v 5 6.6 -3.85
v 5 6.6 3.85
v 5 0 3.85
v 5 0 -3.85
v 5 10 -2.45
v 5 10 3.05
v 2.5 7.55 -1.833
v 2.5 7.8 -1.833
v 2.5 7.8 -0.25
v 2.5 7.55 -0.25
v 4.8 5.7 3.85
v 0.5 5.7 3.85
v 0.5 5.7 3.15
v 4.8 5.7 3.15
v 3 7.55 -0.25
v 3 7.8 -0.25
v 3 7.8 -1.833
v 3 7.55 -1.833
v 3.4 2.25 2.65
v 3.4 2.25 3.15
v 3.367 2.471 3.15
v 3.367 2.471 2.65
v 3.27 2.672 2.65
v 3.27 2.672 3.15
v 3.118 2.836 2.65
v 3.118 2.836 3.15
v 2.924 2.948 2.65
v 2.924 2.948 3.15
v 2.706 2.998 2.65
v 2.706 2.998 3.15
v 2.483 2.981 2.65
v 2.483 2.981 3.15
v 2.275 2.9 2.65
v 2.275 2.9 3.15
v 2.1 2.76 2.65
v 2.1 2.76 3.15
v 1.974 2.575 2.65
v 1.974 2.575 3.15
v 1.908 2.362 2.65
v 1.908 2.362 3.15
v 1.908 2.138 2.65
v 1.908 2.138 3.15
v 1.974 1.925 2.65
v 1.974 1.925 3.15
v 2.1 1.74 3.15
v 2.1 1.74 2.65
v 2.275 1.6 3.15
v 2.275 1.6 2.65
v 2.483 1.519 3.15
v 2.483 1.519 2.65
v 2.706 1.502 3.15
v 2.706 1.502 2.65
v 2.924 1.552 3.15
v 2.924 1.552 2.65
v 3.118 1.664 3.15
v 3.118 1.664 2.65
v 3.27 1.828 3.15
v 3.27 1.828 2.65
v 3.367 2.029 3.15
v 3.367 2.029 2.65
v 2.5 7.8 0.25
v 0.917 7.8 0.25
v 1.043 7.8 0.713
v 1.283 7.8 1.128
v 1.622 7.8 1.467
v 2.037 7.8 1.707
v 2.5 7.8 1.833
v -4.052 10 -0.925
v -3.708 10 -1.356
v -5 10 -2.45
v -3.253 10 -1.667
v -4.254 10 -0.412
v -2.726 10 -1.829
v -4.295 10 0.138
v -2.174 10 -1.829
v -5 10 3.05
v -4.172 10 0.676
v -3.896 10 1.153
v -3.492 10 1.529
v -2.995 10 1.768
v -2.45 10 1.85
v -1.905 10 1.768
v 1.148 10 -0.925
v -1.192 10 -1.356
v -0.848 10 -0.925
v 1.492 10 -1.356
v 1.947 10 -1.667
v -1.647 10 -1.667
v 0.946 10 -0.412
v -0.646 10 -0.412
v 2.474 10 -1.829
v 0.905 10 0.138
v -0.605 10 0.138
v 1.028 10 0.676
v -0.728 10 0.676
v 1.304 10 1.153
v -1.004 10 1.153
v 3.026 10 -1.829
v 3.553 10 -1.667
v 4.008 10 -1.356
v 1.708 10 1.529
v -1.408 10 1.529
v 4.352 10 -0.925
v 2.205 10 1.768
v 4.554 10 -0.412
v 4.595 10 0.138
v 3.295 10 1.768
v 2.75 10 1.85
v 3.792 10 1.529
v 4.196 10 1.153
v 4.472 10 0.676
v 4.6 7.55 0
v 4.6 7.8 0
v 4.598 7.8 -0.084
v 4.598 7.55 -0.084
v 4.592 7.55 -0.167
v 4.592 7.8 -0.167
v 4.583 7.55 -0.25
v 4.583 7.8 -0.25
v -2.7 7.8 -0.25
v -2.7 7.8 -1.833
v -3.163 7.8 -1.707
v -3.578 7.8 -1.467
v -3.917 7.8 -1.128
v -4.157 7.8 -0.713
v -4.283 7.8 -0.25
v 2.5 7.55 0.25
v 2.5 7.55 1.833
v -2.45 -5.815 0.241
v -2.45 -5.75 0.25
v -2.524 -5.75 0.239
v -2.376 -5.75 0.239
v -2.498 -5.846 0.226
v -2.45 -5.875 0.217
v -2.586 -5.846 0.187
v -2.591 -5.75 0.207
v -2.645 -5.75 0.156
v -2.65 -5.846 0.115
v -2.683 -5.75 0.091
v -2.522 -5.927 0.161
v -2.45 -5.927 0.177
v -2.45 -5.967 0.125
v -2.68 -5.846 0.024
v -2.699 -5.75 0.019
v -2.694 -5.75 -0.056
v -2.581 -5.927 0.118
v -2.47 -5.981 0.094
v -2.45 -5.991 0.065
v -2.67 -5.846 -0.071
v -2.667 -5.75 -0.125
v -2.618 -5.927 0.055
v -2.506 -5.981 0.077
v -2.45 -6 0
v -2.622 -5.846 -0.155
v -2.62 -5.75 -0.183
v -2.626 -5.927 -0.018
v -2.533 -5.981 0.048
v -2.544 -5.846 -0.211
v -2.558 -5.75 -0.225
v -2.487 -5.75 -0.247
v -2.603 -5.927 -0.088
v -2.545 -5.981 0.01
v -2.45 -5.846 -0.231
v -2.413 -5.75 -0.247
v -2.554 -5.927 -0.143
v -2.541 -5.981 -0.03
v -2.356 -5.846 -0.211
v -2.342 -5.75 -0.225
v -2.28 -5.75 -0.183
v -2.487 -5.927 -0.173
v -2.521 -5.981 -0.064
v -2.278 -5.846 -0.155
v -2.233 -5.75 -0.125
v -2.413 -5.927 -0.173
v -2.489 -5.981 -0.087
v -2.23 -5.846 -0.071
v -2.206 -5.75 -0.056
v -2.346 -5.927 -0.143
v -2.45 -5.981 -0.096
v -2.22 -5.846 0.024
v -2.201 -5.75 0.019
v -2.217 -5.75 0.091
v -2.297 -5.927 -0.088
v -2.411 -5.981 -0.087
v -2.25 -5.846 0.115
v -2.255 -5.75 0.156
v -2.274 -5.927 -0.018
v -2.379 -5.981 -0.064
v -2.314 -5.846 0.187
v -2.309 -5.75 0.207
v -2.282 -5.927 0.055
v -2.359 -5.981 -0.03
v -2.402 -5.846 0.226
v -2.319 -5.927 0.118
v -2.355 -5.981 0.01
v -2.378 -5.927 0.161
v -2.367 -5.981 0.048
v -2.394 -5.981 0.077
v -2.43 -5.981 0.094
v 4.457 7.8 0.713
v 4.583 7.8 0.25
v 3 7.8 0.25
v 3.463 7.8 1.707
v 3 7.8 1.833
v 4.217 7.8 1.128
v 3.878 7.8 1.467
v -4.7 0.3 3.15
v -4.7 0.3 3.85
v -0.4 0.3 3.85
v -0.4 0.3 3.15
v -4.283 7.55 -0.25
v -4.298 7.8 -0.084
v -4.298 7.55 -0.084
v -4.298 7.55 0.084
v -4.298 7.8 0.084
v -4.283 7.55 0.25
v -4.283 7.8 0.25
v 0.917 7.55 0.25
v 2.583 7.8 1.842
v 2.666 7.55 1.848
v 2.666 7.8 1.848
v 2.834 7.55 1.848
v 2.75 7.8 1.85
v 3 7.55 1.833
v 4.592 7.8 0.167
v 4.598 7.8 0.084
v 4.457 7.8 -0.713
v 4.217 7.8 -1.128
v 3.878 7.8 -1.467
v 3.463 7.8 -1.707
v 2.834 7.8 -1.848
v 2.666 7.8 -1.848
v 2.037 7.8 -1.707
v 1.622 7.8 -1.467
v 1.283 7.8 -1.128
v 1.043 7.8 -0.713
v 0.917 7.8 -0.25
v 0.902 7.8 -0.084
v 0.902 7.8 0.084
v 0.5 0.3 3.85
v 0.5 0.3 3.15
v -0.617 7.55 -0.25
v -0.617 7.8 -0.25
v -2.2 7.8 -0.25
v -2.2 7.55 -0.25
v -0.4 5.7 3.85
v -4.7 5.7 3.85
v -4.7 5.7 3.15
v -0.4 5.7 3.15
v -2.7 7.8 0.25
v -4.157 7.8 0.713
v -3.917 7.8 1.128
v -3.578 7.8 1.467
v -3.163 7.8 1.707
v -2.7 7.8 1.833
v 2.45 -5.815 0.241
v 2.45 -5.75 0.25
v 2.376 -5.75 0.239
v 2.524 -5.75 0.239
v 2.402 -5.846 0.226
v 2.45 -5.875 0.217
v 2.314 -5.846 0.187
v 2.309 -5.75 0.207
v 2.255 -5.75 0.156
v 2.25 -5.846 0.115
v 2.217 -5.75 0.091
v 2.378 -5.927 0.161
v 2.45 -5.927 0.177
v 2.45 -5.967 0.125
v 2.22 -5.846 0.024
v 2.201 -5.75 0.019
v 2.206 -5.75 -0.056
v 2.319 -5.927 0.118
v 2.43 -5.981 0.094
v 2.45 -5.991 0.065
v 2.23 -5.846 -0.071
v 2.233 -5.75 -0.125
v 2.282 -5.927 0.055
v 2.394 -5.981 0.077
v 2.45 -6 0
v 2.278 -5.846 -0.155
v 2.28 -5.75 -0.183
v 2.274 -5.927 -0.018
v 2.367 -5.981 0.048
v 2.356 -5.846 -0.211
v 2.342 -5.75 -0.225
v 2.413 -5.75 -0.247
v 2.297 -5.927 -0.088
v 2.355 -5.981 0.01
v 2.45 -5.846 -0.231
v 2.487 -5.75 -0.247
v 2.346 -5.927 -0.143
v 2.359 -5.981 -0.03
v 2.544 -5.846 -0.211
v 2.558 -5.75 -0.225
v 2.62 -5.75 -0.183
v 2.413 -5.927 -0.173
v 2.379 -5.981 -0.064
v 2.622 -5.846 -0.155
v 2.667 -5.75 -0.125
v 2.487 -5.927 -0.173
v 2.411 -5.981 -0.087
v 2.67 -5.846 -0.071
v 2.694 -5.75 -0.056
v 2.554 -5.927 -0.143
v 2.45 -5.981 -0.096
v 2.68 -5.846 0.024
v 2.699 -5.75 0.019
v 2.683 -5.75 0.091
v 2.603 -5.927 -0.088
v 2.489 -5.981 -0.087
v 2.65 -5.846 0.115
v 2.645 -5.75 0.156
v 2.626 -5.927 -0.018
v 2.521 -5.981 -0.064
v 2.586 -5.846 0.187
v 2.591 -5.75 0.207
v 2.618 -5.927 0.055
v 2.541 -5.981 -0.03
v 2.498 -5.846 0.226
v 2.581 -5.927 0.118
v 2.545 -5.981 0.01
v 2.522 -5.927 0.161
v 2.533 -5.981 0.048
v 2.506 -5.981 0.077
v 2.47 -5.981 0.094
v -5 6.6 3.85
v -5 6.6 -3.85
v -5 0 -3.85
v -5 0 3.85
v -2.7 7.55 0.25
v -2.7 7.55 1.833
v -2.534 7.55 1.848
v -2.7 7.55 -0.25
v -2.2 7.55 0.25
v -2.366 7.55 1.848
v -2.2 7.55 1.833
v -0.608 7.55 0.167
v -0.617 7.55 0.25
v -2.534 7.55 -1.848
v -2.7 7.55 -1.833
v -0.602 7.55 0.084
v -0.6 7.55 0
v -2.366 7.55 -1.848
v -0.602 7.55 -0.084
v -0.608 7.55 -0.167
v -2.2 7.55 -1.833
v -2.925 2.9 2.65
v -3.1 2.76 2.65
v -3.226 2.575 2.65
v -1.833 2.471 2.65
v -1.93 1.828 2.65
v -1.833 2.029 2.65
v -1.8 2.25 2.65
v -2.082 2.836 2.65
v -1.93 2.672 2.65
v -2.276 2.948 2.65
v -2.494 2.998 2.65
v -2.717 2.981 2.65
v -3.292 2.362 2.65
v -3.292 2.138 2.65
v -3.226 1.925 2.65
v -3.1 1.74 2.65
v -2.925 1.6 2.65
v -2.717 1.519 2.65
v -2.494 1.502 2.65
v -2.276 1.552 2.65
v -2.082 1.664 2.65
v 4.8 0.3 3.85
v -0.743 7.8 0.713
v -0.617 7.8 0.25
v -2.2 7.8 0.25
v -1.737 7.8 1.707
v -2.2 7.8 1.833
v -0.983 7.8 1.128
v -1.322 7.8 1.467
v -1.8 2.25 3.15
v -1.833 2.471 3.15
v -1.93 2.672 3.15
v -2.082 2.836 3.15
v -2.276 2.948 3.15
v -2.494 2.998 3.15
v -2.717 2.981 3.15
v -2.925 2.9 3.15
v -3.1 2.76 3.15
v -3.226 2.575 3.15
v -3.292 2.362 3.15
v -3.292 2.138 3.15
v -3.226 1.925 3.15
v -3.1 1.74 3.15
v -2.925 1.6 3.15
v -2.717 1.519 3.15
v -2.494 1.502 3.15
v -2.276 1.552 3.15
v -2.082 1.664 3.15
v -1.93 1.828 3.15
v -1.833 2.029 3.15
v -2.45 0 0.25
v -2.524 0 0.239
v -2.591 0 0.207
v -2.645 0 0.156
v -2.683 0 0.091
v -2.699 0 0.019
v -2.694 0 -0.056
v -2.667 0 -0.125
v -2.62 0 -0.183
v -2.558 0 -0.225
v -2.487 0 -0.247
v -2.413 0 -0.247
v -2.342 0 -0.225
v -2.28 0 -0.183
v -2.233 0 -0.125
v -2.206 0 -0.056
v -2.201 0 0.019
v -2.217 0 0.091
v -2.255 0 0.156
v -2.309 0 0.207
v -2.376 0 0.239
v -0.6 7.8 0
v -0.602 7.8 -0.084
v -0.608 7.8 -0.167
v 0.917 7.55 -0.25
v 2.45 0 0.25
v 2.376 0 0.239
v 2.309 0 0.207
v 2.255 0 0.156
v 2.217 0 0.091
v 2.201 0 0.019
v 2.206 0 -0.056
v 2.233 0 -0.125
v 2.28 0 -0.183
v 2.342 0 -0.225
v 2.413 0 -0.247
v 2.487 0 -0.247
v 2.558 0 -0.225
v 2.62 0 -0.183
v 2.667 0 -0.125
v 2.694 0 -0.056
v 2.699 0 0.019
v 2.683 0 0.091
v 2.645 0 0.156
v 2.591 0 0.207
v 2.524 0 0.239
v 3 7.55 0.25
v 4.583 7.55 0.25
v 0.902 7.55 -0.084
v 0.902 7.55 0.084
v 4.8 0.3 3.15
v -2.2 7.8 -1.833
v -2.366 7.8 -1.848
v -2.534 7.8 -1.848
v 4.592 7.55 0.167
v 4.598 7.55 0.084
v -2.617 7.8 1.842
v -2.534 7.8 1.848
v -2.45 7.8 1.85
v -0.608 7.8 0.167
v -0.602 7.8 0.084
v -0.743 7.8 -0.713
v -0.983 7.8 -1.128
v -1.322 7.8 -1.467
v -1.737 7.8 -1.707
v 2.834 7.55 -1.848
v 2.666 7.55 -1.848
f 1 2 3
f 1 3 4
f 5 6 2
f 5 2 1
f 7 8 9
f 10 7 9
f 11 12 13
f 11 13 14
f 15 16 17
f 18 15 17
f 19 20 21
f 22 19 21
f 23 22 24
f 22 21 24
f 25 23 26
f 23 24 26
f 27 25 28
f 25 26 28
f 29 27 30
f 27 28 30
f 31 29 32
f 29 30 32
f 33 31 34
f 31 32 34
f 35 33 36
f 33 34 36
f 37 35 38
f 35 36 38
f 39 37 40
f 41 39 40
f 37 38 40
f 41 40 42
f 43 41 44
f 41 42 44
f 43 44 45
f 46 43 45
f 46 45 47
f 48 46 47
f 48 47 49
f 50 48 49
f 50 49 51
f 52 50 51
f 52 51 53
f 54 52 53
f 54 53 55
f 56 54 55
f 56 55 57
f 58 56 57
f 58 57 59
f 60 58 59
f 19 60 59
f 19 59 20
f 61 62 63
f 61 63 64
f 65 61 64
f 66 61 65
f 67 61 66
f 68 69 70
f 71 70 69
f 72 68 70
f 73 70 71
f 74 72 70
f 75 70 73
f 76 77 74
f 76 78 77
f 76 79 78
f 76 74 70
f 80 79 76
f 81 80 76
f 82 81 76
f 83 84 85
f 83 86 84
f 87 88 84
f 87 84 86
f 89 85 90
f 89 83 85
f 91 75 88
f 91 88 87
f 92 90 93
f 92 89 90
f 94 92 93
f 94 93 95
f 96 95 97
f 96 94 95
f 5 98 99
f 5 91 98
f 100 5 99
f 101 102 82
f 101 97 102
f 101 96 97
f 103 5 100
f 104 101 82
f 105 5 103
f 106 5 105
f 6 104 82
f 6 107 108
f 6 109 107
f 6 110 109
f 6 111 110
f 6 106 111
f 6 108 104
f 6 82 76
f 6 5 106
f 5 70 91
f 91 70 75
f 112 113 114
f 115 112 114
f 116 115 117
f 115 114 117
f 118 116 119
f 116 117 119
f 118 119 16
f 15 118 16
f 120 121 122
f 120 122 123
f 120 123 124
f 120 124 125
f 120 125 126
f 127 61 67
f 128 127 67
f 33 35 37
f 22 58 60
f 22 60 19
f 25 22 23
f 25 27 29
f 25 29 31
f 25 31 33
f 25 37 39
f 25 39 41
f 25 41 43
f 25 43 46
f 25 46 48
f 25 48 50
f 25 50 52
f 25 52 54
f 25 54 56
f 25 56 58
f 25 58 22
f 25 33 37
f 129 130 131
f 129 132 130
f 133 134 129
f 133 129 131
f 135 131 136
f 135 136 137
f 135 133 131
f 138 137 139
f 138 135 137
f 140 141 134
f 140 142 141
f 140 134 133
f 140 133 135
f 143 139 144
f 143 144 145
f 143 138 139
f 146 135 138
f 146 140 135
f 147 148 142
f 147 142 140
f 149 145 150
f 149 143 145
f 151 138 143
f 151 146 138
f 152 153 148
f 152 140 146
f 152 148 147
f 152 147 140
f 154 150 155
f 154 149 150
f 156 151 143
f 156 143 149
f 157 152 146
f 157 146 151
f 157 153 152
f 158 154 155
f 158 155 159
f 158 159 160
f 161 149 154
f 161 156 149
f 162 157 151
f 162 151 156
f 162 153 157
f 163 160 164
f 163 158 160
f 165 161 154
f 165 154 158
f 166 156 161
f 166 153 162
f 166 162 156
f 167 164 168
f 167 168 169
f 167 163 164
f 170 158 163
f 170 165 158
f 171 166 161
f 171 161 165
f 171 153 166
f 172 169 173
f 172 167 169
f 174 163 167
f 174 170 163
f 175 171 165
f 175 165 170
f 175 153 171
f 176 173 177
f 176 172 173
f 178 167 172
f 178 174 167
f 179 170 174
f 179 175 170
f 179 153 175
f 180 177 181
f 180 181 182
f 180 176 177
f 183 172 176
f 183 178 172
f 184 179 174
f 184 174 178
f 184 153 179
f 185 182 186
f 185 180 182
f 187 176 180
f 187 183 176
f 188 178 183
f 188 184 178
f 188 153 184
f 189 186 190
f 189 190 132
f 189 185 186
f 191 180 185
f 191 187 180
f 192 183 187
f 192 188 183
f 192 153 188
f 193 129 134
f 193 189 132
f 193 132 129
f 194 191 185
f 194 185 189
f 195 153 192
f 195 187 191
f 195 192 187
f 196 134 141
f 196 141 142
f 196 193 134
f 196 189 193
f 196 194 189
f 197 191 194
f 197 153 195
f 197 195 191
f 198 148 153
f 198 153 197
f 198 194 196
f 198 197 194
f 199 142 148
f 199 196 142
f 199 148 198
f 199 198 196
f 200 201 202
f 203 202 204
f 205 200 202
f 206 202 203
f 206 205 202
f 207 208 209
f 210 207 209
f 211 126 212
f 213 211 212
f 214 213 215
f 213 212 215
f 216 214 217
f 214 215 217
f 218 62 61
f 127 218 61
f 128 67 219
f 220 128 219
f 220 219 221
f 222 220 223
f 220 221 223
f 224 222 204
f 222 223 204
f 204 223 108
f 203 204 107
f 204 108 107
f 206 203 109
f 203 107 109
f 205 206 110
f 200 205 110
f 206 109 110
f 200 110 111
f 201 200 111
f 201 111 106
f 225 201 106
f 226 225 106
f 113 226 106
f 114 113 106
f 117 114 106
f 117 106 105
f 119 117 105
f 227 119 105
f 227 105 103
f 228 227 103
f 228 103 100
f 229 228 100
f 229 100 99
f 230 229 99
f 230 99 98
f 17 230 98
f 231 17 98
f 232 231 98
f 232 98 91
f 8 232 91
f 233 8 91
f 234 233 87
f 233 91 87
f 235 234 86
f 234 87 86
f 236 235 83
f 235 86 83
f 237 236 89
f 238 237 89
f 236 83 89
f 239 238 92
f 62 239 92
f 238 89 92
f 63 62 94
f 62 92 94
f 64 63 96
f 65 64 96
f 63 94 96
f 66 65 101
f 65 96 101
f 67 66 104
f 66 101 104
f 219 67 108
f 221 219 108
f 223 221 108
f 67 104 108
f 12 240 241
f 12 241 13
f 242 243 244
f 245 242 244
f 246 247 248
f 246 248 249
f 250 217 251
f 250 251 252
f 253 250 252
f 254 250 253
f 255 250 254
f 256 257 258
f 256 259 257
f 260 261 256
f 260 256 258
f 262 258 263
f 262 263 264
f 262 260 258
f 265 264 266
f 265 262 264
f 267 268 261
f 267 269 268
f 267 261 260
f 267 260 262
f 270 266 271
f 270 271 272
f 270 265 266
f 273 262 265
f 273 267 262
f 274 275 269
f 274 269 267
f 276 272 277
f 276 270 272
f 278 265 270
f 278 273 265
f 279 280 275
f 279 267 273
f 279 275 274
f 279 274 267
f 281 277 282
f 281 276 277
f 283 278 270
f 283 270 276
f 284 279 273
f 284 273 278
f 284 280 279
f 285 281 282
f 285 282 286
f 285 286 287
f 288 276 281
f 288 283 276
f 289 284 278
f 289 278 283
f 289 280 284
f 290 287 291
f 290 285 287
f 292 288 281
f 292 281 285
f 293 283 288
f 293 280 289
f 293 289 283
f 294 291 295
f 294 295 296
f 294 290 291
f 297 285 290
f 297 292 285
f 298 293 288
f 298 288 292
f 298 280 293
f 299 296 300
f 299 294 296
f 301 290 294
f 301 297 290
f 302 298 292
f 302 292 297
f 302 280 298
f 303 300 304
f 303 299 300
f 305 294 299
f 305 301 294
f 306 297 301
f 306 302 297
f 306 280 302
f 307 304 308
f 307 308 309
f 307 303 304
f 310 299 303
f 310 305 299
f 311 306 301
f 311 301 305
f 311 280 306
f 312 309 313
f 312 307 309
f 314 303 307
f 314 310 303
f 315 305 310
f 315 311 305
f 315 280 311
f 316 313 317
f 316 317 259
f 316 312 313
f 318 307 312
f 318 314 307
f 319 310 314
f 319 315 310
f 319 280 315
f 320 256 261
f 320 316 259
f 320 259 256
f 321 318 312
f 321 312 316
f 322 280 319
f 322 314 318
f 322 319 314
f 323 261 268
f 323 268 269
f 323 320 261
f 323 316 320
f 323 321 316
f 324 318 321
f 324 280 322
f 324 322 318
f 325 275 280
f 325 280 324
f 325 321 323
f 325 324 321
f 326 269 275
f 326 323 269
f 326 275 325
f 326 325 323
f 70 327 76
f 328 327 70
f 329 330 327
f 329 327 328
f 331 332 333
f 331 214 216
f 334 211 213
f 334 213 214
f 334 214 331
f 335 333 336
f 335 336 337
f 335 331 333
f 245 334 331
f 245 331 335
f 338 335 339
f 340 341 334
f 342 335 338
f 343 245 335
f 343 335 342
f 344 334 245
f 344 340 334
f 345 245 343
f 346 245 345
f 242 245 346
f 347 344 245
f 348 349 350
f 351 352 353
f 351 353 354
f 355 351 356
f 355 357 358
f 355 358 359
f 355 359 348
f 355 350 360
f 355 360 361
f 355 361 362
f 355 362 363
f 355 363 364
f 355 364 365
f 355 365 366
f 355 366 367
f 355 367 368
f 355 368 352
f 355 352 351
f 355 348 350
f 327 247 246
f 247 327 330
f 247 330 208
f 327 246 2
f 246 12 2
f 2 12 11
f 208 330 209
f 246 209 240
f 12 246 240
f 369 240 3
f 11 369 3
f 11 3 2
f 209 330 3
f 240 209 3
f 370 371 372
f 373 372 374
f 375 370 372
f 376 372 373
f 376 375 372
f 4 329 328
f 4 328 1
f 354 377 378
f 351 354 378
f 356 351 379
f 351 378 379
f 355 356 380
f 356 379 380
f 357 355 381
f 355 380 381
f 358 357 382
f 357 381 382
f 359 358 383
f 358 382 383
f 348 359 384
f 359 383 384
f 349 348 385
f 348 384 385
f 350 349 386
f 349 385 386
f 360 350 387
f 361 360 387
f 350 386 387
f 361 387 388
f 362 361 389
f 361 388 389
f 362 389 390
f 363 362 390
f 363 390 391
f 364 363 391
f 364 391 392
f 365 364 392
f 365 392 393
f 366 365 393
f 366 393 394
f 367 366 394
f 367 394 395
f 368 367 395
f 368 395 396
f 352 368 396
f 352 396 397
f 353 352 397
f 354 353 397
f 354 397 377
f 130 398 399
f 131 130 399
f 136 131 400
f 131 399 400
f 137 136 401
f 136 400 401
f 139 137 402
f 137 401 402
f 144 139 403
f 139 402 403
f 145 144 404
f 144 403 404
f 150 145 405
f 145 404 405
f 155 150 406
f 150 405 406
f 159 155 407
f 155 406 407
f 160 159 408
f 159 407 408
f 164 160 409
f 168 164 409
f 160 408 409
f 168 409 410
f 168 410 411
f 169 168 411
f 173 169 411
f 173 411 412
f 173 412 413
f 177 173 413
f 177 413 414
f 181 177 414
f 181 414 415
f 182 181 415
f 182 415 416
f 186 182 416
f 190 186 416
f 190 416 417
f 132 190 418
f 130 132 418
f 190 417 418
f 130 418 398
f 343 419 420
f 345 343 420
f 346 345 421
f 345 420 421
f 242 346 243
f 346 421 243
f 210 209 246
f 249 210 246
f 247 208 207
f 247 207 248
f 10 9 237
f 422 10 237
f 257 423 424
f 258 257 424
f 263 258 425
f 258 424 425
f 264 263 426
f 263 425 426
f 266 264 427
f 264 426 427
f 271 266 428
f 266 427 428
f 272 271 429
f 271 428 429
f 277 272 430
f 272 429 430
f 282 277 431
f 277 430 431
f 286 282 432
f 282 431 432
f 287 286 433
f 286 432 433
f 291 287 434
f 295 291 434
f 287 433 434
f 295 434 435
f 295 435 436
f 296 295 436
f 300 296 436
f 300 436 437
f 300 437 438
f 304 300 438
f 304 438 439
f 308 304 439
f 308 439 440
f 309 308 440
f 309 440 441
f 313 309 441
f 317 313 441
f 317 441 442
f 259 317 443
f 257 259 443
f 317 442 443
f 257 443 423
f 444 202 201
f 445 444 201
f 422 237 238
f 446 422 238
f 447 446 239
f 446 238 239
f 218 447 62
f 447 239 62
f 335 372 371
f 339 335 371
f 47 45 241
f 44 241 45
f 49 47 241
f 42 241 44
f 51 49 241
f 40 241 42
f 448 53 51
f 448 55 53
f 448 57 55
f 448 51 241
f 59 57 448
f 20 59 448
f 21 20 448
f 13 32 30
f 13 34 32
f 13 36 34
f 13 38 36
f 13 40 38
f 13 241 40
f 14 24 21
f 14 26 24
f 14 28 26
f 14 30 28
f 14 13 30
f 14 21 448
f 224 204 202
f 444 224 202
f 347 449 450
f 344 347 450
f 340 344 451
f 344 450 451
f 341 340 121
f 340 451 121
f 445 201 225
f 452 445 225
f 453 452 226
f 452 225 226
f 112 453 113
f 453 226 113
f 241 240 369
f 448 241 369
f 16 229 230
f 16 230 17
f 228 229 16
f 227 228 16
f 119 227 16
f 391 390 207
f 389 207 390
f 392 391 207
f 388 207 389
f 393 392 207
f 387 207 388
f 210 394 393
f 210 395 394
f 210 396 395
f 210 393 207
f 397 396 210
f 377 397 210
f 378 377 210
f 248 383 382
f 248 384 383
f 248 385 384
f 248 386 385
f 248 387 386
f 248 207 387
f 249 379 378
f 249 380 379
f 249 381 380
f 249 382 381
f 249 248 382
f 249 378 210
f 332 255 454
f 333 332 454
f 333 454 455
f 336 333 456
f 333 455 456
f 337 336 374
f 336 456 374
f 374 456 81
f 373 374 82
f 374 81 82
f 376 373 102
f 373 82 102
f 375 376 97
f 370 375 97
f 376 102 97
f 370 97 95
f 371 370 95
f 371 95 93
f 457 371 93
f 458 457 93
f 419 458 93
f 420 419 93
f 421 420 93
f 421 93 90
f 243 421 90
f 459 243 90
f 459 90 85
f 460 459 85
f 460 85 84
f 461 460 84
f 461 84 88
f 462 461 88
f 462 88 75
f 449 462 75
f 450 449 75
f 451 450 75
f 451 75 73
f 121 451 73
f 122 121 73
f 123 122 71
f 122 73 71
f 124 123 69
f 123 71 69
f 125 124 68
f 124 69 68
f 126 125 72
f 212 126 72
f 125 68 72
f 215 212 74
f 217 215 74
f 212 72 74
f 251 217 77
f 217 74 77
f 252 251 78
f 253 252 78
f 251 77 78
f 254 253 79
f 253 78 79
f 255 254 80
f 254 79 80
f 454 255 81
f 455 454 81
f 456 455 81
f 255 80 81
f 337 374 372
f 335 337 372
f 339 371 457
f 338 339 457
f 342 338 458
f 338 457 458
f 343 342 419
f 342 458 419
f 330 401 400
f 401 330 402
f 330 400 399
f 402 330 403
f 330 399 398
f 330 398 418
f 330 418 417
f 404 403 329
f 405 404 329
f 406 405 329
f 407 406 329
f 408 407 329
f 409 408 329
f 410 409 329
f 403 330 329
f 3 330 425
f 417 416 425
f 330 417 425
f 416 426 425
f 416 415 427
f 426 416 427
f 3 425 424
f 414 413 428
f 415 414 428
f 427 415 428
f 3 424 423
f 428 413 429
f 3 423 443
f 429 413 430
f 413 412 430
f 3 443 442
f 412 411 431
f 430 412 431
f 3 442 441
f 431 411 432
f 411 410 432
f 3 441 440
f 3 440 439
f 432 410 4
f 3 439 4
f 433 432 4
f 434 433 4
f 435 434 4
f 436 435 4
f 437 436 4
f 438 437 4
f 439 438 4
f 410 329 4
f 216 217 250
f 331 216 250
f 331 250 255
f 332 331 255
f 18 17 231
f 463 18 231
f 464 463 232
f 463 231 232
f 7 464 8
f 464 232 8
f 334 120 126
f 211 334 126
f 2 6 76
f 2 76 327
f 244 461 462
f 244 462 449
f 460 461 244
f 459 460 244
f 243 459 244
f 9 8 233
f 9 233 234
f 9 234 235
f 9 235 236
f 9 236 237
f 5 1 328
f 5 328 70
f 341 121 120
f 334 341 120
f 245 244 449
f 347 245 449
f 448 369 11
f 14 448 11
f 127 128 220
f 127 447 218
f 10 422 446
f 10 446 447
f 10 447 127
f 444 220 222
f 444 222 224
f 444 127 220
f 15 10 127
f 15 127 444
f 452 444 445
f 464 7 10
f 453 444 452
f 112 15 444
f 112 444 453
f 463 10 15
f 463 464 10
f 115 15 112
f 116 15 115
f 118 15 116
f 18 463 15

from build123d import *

# Parameters (mm, degrees)
CROQUIS1_W                          = 10
CROQUIS1_H                          = 7.7
SALIENTE_EXTRUIR1_DEPTH             = 6.6
SALIENTE_EXTRUIR2_REACH             = 11.131
SALIENTE_EXTRUIR2_DIRECTION_2_REACH = 11.131
CROQUIS3_R                          = 1.85
CORTAR_EXTRUIR1_DEPTH               = 2.2
CORTAR_EXTRUIR2_DEPTH               = 0.25
MATRIZL1_COUNT                      = 2
MATRIZL1_PITCH                      = 5.2
CROQUIS5_W                          = 4.3
CROQUIS5_H                          = 5.4
CROQUIS5_R                          = 0.75
CORTAR_EXTRUIR3_DEPTH               = 0.7
CROQUIS5_2_R                        = 0.75
CORTAR_EXTRUIR4_DEPTH               = 1.2
MATRIZL2_COUNT                      = 2
MATRIZL2_PITCH                      = 5.2
CROQUIS6_R                          = 0.25
SALIENTE_EXTRUIR3_DEPTH             = 6
REDONDEO1_R                         = 0.25


with BuildPart() as part:
    # Croquis1 → Saliente-Extruir1 (new body)
    with BuildSketch(Plane(origin=(0, 0, 0), x_dir=(1, 0, 0), z_dir=(0, 1, 0))):
        Rectangle(CROQUIS1_W, CROQUIS1_H)
    extrude(amount=SALIENTE_EXTRUIR1_DEPTH)

    # Saliente-Extruir2: up to this face of the body (flat: up to its plane)
    saliente_extruir2_end = Plane(part.part.faces().sort_by_distance((5, 3.3, 0))[0])
    # Croquis2 → Saliente-Extruir2 (add, up to the picked face)
    with BuildSketch(Plane(origin=(0, 0, 0), x_dir=(0, 0, -1), z_dir=(1, 0, 0)), mode=Mode.PRIVATE) as saliente_extruir2_sk1:
        Polygon((-3.85, 6.6), (3.85, 6.6), (2.45, 10), (-3.05, 10), align=None)
    saliente_extruir2_tool1 = split(extrude(saliente_extruir2_sk1.sketch, amount=SALIENTE_EXTRUIR2_REACH, mode=Mode.PRIVATE), bisect_by=saliente_extruir2_end, keep=Keep.BOTH, mode=Mode.PRIVATE)
    add(saliente_extruir2_tool1.solids().sort_by(Axis((0, 8.205556, 0.141667), (1, 0, 0)))[0])

    # Saliente-Extruir2 direction 2: up to this face of the body (flat: up to its plane)
    saliente_extruir2_direction_2_end = Plane(part.part.faces().sort_by_distance((-5, 3.3, 0))[0])
    # Croquis2 → Saliente-Extruir2 direction 2 (add, up to the picked face)
    with BuildSketch(Plane(origin=(0, 0, 0), x_dir=(0, 0, -1), z_dir=(1, 0, 0)), mode=Mode.PRIVATE) as saliente_extruir2_direction_2_sk1:
        Polygon((-3.85, 6.6), (3.85, 6.6), (2.45, 10), (-3.05, 10), align=None)
    saliente_extruir2_direction_2_tool1 = split(extrude(saliente_extruir2_direction_2_sk1.sketch, amount=-SALIENTE_EXTRUIR2_DIRECTION_2_REACH, mode=Mode.PRIVATE), bisect_by=saliente_extruir2_direction_2_end, keep=Keep.BOTH, mode=Mode.PRIVATE)
    add(saliente_extruir2_direction_2_tool1.solids().sort_by(Axis((0, 8.205556, 0.141667), (-1, 0, 0)))[0])

    # Croquis3 → Cortar-Extruir1 (cut)
    with BuildSketch(Plane(origin=(0, 10, 0), x_dir=(1, 0, 0), z_dir=(0, 1, 0))):
        with Locations((-2.45, 0)):
            Circle(CROQUIS3_R)
    cortar_extruir1 = extrude(amount=-CORTAR_EXTRUIR1_DEPTH, mode=Mode.SUBTRACT)

    # Croquis4 → Cortar-Extruir2 (cut)
    with BuildSketch(Plane(origin=(0, 7.8, 0), x_dir=(1, 0, 0), z_dir=(0, 1, 0))):
        with BuildLine():
            ThreePointArc((-2.7, -1.833030278), (-2.45, -1.85), (-2.2, -1.833030278))
            Line((-2.2, -1.833030278), (-2.2, -0.25))
            Line((-2.2, -0.25), (-0.616969722, -0.25))
            ThreePointArc((-0.616969722, -0.25), (-0.604247306, -0.125287641), (-0.6, 0))
            ThreePointArc((-0.6, 0), (-0.604247306, 0.125287641), (-0.616969722, 0.25))
            Line((-0.616969722, 0.25), (-2.2, 0.25))
            Line((-2.2, 0.25), (-2.2, 1.833030278))
            ThreePointArc((-2.2, 1.833030278), (-2.45, 1.85), (-2.7, 1.833030278))
            Line((-2.7, 1.833030278), (-2.7, 0.25))
            Line((-2.7, 0.25), (-4.283030278, 0.25))
            ThreePointArc((-4.283030278, 0.25), (-4.3, 0), (-4.283030278, -0.25))
            Line((-4.283030278, -0.25), (-2.7, -0.25))
            Line((-2.7, -0.25), (-2.7, -1.833030278))
        make_face()
    cortar_extruir2 = extrude(amount=-CORTAR_EXTRUIR2_DEPTH, mode=Mode.SUBTRACT)

    # MatrizL1: Cortar-Extruir1, Cortar-Extruir2 ×2
    with Locations(*[(i * MATRIZL1_PITCH, 0, 0) for i in range(1, MATRIZL1_COUNT)]):
        add(cortar_extruir1, mode=Mode.SUBTRACT)
        add(cortar_extruir2, mode=Mode.SUBTRACT)

    # Croquis5 → Cortar-Extruir3 (cut)
    with BuildSketch(Plane.XY.offset(3.85)):
        with Locations((-2.55, 3)):
            Rectangle(CROQUIS5_W, CROQUIS5_H)
        with Locations((-2.55, 2.25)):
            Circle(CROQUIS5_R, mode=Mode.SUBTRACT)
    cortar_extruir3 = extrude(amount=-CORTAR_EXTRUIR3_DEPTH, mode=Mode.SUBTRACT)

    # Croquis5<2> → Cortar-Extruir4 (cut)
    with BuildSketch(Plane.XY.offset(3.85)):
        with Locations((-2.55, 2.25)):
            Circle(CROQUIS5_2_R)
    cortar_extruir4 = extrude(amount=-CORTAR_EXTRUIR4_DEPTH, mode=Mode.SUBTRACT)

    # MatrizL2: Cortar-Extruir3, Cortar-Extruir4 ×2
    with Locations(*[(i * MATRIZL2_PITCH, 0, 0) for i in range(1, MATRIZL2_COUNT)]):
        add(cortar_extruir3, mode=Mode.SUBTRACT)
        add(cortar_extruir4, mode=Mode.SUBTRACT)

    # Croquis6 → Saliente-Extruir3 (add)
    with BuildSketch(Plane.XZ):
        with Locations((-2.45, 0)):
            Circle(CROQUIS6_R)
        with Locations((2.45, 0)):
            Circle(CROQUIS6_R)
    extrude(amount=SALIENTE_EXTRUIR3_DEPTH)

    # Redondeo1
    redondeo1_edges = [part.edges().sort_by_distance(p)[0] for p in [
        (-2.7, -6, 0),
        (2.2, -6, 0),
    ]]
    fillet(redondeo1_edges, radius=REDONDEO1_R)


solid = part.part
